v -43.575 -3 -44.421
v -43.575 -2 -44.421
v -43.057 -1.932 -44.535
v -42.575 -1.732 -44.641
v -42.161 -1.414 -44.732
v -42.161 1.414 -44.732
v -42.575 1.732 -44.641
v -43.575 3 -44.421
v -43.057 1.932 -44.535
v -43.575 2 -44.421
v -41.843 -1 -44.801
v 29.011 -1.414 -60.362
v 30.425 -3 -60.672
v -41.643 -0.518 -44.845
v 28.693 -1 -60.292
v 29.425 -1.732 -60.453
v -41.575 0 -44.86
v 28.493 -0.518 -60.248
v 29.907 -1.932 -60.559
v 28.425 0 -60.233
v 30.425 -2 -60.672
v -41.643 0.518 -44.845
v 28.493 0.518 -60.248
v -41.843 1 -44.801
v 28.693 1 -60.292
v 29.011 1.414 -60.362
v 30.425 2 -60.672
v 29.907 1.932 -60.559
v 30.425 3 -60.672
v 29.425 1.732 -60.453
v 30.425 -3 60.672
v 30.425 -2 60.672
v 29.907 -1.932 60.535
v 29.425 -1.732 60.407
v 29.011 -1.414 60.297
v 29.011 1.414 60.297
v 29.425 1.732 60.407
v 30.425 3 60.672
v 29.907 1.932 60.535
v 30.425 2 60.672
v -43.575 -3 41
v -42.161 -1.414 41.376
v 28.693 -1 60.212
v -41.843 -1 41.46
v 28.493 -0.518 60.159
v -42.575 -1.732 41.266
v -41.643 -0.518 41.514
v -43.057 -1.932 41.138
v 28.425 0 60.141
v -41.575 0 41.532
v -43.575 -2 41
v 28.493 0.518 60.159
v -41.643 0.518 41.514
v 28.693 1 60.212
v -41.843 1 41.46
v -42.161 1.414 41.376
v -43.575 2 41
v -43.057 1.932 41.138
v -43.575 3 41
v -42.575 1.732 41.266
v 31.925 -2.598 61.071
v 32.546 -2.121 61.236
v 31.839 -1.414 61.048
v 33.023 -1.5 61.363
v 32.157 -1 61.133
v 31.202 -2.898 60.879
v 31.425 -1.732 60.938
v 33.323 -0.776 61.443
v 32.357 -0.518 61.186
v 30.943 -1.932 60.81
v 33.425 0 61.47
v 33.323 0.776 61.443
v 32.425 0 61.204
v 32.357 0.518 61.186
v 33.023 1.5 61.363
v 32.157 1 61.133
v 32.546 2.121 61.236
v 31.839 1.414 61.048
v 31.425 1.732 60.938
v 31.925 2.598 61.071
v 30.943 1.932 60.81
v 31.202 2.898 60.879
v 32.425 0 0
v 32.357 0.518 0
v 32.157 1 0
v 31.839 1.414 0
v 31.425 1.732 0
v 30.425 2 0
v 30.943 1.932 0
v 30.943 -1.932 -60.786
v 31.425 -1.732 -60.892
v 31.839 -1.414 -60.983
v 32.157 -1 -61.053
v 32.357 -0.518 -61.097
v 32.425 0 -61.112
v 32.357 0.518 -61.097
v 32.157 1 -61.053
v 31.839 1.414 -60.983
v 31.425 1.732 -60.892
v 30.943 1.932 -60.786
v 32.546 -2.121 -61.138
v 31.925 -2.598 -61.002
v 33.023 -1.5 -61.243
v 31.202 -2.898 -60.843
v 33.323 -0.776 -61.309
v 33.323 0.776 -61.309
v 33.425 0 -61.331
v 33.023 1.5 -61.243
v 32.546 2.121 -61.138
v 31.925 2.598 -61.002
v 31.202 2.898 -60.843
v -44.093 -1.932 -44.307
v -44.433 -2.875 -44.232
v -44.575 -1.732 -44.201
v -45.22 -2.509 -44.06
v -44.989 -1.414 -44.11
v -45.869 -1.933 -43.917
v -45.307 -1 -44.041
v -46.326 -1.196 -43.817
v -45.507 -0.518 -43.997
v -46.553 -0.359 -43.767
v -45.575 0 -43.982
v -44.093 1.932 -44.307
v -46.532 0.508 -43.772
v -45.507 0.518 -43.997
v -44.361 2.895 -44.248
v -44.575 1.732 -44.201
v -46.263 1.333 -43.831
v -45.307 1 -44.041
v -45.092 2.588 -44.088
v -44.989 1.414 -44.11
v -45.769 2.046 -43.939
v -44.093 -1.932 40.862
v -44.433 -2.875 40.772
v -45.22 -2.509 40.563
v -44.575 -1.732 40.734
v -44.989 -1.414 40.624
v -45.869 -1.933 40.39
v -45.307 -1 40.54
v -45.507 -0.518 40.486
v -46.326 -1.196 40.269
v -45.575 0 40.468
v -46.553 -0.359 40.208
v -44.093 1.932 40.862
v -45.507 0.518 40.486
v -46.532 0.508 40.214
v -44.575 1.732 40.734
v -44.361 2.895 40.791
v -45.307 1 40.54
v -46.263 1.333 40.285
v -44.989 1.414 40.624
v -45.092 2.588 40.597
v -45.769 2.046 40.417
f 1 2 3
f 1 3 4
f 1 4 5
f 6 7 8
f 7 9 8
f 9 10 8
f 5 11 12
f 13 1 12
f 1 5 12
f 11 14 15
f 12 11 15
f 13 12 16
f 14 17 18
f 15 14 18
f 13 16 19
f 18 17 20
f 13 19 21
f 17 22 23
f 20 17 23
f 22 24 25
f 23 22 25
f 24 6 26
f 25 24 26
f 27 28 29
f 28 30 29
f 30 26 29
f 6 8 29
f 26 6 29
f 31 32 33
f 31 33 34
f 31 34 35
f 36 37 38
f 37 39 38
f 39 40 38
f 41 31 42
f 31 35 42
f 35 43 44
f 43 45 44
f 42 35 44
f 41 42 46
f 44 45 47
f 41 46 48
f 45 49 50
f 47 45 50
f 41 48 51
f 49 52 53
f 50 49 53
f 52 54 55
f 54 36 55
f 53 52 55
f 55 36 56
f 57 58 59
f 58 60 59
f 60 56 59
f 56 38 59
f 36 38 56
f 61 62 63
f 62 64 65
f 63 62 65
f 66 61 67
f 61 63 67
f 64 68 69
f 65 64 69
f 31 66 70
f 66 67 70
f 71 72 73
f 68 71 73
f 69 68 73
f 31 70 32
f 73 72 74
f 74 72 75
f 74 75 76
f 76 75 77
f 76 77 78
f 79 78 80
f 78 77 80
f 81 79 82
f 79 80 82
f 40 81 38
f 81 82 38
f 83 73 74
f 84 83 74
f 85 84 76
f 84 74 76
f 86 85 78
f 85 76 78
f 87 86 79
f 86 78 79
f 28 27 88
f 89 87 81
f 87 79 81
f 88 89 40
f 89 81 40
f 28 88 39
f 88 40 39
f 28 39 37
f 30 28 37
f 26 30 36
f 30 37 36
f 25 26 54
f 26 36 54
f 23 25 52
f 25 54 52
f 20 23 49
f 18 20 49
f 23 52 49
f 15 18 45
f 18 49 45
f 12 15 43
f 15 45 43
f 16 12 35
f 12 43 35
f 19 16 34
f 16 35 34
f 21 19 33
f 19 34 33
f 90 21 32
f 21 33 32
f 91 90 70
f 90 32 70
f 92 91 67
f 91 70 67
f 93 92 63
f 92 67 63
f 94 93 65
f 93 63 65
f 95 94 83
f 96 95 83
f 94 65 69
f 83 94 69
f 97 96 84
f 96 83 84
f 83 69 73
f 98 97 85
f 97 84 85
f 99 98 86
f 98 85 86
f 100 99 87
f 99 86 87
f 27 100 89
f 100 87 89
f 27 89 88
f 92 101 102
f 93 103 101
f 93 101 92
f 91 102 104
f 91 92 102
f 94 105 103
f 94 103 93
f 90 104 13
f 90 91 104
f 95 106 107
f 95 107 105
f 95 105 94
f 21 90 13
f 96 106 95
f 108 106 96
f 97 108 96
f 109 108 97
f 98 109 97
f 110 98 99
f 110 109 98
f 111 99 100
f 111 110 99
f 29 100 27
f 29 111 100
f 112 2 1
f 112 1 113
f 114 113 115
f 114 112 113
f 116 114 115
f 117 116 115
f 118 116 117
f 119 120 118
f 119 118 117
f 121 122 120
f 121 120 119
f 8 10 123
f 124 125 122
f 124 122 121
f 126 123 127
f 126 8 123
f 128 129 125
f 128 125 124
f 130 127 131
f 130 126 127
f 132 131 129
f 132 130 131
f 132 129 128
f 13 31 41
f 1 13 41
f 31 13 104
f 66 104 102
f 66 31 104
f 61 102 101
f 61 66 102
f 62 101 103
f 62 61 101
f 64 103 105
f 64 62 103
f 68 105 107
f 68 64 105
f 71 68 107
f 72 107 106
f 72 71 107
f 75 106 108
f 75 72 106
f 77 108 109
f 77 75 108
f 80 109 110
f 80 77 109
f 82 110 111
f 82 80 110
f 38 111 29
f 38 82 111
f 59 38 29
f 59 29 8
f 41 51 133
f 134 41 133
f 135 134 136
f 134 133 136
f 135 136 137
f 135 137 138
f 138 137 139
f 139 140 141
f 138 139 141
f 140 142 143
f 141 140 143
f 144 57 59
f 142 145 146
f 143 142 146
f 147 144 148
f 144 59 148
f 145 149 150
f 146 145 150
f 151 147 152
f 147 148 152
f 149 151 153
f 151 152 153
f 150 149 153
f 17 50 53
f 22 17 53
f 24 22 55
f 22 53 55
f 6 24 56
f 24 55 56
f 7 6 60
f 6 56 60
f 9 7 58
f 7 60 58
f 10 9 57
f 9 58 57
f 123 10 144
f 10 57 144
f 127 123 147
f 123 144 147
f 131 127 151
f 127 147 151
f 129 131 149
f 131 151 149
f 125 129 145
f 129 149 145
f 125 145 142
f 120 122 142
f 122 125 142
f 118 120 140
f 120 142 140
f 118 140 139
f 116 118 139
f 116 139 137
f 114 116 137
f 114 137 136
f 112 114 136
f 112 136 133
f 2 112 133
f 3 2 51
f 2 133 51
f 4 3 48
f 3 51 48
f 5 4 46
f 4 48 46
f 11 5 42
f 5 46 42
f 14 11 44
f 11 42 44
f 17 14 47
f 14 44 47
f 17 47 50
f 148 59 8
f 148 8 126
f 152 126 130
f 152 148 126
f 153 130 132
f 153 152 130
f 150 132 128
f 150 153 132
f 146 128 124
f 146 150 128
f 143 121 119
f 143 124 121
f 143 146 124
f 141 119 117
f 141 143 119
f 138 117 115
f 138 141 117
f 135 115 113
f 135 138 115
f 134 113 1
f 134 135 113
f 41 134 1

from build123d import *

# Parameters (mm, degrees)
BOSS_EXTRUDE1_DEPTH = 3
BOSS_EXTRUDE2_REACH = 76.759
SKETCH2_R           = 3
BOSS_EXTRUDE3_REACH = 79.18
SKETCH2_3_R         = 3
SKETCH2_3_R_2       = 2
SKETCH2_4_R         = 2
CUT_EXTRUDE1_DEPTH  = 103


with BuildPart() as part:
    # Sketch1 → Boss-Extrude1 (new, symmetric)
    with BuildSketch(Plane(origin=(0, 0, 0), x_dir=(1, 0, 0), z_dir=(0, 1, 0))):
        Polygon((-43.574876661, 44.4209239), (-43.574876661, -41), (30.425123339, -60.672481425), (30.425123339, 60.672481425), align=None)
    extrude(amount=BOSS_EXTRUDE1_DEPTH, both=True)

    # Boss-Extrude2: up to this plane
    boss_extrude2_end = Plane(origin=(-13.056453191, 3, 49.113150255), z_dir=(0.2569206163076567, 0, -0.9664325102748219))
    # Sketch2 → Boss-Extrude2 (add, up to the surface)
    with BuildSketch(Plane.XY, mode=Mode.PRIVATE) as boss_extrude2_sk1:
        with Locations((30.425123339, 0)):
            Circle(SKETCH2_R)
    boss_extrude2_tool1 = split(extrude(boss_extrude2_sk1.sketch, amount=BOSS_EXTRUDE2_REACH, mode=Mode.PRIVATE), bisect_by=boss_extrude2_end, keep=Keep.BOTH, mode=Mode.PRIVATE)
    add(boss_extrude2_tool1.solids().sort_by_distance((30.425123, 0, 0))[0])
    # Sketch2 → Boss-Extrude2 (add, up to the surface)
    with BuildSketch(Plane.XY, mode=Mode.PRIVATE) as boss_extrude2_sk2:
        with Locations((-43.574876661, 0)):
            Circle(SKETCH2_R)
    boss_extrude2_tool2 = split(extrude(boss_extrude2_sk2.sketch, amount=BOSS_EXTRUDE2_REACH, mode=Mode.PRIVATE), bisect_by=boss_extrude2_end, keep=Keep.BOTH, mode=Mode.PRIVATE)
    add(boss_extrude2_tool2.solids().sort_by_distance((-43.574877, 0, 0))[0])

    # Boss-Extrude3: up to this plane
    boss_extrude3_end = Plane(origin=(-11.311619848, 3, -51.506439766), z_dir=(-0.21450368815955828, 0, -0.9767231786775346))
    # Sketch2<3> → Boss-Extrude3 (add, up to the surface)
    with BuildSketch(Plane.XY, mode=Mode.PRIVATE) as boss_extrude3_sk1:
        with Locations((30.425123339, 0)):
            Circle(SKETCH2_3_R)
        with Locations((30.425123339, 0)):
            Circle(SKETCH2_3_R_2, mode=Mode.SUBTRACT)
    boss_extrude3_tool1 = split(extrude(boss_extrude3_sk1.sketch, amount=-BOSS_EXTRUDE3_REACH, mode=Mode.PRIVATE), bisect_by=boss_extrude3_end, keep=Keep.BOTH, mode=Mode.PRIVATE)
    add(boss_extrude3_tool1.solids().sort_by_distance((27.509976, 0, 0))[0])
    # Sketch2<3> → Boss-Extrude3 (add, up to the surface)
    with BuildSketch(Plane.XY, mode=Mode.PRIVATE) as boss_extrude3_sk2:
        with Locations((-43.574876661, 0)):
            Circle(SKETCH2_3_R)
        with Locations((-43.574876661, 0)):
            Circle(SKETCH2_3_R_2, mode=Mode.SUBTRACT)
    boss_extrude3_tool2 = split(extrude(boss_extrude3_sk2.sketch, amount=-BOSS_EXTRUDE3_REACH, mode=Mode.PRIVATE), bisect_by=boss_extrude3_end, keep=Keep.BOTH, mode=Mode.PRIVATE)
    add(boss_extrude3_tool2.solids().sort_by_distance((-46.490024, 0, 0))[0])

    # Sketch2<4> → Cut-Extrude1 (cut, symmetric)
    with BuildSketch(Plane.XY):
        with Locations((30.425123339, 0)):
            Circle(SKETCH2_4_R)
        with Locations((-43.574876661, 0)):
            Circle(SKETCH2_4_R)
    extrude(amount=CUT_EXTRUDE1_DEPTH, both=True, mode=Mode.SUBTRACT)


solid = part.part
